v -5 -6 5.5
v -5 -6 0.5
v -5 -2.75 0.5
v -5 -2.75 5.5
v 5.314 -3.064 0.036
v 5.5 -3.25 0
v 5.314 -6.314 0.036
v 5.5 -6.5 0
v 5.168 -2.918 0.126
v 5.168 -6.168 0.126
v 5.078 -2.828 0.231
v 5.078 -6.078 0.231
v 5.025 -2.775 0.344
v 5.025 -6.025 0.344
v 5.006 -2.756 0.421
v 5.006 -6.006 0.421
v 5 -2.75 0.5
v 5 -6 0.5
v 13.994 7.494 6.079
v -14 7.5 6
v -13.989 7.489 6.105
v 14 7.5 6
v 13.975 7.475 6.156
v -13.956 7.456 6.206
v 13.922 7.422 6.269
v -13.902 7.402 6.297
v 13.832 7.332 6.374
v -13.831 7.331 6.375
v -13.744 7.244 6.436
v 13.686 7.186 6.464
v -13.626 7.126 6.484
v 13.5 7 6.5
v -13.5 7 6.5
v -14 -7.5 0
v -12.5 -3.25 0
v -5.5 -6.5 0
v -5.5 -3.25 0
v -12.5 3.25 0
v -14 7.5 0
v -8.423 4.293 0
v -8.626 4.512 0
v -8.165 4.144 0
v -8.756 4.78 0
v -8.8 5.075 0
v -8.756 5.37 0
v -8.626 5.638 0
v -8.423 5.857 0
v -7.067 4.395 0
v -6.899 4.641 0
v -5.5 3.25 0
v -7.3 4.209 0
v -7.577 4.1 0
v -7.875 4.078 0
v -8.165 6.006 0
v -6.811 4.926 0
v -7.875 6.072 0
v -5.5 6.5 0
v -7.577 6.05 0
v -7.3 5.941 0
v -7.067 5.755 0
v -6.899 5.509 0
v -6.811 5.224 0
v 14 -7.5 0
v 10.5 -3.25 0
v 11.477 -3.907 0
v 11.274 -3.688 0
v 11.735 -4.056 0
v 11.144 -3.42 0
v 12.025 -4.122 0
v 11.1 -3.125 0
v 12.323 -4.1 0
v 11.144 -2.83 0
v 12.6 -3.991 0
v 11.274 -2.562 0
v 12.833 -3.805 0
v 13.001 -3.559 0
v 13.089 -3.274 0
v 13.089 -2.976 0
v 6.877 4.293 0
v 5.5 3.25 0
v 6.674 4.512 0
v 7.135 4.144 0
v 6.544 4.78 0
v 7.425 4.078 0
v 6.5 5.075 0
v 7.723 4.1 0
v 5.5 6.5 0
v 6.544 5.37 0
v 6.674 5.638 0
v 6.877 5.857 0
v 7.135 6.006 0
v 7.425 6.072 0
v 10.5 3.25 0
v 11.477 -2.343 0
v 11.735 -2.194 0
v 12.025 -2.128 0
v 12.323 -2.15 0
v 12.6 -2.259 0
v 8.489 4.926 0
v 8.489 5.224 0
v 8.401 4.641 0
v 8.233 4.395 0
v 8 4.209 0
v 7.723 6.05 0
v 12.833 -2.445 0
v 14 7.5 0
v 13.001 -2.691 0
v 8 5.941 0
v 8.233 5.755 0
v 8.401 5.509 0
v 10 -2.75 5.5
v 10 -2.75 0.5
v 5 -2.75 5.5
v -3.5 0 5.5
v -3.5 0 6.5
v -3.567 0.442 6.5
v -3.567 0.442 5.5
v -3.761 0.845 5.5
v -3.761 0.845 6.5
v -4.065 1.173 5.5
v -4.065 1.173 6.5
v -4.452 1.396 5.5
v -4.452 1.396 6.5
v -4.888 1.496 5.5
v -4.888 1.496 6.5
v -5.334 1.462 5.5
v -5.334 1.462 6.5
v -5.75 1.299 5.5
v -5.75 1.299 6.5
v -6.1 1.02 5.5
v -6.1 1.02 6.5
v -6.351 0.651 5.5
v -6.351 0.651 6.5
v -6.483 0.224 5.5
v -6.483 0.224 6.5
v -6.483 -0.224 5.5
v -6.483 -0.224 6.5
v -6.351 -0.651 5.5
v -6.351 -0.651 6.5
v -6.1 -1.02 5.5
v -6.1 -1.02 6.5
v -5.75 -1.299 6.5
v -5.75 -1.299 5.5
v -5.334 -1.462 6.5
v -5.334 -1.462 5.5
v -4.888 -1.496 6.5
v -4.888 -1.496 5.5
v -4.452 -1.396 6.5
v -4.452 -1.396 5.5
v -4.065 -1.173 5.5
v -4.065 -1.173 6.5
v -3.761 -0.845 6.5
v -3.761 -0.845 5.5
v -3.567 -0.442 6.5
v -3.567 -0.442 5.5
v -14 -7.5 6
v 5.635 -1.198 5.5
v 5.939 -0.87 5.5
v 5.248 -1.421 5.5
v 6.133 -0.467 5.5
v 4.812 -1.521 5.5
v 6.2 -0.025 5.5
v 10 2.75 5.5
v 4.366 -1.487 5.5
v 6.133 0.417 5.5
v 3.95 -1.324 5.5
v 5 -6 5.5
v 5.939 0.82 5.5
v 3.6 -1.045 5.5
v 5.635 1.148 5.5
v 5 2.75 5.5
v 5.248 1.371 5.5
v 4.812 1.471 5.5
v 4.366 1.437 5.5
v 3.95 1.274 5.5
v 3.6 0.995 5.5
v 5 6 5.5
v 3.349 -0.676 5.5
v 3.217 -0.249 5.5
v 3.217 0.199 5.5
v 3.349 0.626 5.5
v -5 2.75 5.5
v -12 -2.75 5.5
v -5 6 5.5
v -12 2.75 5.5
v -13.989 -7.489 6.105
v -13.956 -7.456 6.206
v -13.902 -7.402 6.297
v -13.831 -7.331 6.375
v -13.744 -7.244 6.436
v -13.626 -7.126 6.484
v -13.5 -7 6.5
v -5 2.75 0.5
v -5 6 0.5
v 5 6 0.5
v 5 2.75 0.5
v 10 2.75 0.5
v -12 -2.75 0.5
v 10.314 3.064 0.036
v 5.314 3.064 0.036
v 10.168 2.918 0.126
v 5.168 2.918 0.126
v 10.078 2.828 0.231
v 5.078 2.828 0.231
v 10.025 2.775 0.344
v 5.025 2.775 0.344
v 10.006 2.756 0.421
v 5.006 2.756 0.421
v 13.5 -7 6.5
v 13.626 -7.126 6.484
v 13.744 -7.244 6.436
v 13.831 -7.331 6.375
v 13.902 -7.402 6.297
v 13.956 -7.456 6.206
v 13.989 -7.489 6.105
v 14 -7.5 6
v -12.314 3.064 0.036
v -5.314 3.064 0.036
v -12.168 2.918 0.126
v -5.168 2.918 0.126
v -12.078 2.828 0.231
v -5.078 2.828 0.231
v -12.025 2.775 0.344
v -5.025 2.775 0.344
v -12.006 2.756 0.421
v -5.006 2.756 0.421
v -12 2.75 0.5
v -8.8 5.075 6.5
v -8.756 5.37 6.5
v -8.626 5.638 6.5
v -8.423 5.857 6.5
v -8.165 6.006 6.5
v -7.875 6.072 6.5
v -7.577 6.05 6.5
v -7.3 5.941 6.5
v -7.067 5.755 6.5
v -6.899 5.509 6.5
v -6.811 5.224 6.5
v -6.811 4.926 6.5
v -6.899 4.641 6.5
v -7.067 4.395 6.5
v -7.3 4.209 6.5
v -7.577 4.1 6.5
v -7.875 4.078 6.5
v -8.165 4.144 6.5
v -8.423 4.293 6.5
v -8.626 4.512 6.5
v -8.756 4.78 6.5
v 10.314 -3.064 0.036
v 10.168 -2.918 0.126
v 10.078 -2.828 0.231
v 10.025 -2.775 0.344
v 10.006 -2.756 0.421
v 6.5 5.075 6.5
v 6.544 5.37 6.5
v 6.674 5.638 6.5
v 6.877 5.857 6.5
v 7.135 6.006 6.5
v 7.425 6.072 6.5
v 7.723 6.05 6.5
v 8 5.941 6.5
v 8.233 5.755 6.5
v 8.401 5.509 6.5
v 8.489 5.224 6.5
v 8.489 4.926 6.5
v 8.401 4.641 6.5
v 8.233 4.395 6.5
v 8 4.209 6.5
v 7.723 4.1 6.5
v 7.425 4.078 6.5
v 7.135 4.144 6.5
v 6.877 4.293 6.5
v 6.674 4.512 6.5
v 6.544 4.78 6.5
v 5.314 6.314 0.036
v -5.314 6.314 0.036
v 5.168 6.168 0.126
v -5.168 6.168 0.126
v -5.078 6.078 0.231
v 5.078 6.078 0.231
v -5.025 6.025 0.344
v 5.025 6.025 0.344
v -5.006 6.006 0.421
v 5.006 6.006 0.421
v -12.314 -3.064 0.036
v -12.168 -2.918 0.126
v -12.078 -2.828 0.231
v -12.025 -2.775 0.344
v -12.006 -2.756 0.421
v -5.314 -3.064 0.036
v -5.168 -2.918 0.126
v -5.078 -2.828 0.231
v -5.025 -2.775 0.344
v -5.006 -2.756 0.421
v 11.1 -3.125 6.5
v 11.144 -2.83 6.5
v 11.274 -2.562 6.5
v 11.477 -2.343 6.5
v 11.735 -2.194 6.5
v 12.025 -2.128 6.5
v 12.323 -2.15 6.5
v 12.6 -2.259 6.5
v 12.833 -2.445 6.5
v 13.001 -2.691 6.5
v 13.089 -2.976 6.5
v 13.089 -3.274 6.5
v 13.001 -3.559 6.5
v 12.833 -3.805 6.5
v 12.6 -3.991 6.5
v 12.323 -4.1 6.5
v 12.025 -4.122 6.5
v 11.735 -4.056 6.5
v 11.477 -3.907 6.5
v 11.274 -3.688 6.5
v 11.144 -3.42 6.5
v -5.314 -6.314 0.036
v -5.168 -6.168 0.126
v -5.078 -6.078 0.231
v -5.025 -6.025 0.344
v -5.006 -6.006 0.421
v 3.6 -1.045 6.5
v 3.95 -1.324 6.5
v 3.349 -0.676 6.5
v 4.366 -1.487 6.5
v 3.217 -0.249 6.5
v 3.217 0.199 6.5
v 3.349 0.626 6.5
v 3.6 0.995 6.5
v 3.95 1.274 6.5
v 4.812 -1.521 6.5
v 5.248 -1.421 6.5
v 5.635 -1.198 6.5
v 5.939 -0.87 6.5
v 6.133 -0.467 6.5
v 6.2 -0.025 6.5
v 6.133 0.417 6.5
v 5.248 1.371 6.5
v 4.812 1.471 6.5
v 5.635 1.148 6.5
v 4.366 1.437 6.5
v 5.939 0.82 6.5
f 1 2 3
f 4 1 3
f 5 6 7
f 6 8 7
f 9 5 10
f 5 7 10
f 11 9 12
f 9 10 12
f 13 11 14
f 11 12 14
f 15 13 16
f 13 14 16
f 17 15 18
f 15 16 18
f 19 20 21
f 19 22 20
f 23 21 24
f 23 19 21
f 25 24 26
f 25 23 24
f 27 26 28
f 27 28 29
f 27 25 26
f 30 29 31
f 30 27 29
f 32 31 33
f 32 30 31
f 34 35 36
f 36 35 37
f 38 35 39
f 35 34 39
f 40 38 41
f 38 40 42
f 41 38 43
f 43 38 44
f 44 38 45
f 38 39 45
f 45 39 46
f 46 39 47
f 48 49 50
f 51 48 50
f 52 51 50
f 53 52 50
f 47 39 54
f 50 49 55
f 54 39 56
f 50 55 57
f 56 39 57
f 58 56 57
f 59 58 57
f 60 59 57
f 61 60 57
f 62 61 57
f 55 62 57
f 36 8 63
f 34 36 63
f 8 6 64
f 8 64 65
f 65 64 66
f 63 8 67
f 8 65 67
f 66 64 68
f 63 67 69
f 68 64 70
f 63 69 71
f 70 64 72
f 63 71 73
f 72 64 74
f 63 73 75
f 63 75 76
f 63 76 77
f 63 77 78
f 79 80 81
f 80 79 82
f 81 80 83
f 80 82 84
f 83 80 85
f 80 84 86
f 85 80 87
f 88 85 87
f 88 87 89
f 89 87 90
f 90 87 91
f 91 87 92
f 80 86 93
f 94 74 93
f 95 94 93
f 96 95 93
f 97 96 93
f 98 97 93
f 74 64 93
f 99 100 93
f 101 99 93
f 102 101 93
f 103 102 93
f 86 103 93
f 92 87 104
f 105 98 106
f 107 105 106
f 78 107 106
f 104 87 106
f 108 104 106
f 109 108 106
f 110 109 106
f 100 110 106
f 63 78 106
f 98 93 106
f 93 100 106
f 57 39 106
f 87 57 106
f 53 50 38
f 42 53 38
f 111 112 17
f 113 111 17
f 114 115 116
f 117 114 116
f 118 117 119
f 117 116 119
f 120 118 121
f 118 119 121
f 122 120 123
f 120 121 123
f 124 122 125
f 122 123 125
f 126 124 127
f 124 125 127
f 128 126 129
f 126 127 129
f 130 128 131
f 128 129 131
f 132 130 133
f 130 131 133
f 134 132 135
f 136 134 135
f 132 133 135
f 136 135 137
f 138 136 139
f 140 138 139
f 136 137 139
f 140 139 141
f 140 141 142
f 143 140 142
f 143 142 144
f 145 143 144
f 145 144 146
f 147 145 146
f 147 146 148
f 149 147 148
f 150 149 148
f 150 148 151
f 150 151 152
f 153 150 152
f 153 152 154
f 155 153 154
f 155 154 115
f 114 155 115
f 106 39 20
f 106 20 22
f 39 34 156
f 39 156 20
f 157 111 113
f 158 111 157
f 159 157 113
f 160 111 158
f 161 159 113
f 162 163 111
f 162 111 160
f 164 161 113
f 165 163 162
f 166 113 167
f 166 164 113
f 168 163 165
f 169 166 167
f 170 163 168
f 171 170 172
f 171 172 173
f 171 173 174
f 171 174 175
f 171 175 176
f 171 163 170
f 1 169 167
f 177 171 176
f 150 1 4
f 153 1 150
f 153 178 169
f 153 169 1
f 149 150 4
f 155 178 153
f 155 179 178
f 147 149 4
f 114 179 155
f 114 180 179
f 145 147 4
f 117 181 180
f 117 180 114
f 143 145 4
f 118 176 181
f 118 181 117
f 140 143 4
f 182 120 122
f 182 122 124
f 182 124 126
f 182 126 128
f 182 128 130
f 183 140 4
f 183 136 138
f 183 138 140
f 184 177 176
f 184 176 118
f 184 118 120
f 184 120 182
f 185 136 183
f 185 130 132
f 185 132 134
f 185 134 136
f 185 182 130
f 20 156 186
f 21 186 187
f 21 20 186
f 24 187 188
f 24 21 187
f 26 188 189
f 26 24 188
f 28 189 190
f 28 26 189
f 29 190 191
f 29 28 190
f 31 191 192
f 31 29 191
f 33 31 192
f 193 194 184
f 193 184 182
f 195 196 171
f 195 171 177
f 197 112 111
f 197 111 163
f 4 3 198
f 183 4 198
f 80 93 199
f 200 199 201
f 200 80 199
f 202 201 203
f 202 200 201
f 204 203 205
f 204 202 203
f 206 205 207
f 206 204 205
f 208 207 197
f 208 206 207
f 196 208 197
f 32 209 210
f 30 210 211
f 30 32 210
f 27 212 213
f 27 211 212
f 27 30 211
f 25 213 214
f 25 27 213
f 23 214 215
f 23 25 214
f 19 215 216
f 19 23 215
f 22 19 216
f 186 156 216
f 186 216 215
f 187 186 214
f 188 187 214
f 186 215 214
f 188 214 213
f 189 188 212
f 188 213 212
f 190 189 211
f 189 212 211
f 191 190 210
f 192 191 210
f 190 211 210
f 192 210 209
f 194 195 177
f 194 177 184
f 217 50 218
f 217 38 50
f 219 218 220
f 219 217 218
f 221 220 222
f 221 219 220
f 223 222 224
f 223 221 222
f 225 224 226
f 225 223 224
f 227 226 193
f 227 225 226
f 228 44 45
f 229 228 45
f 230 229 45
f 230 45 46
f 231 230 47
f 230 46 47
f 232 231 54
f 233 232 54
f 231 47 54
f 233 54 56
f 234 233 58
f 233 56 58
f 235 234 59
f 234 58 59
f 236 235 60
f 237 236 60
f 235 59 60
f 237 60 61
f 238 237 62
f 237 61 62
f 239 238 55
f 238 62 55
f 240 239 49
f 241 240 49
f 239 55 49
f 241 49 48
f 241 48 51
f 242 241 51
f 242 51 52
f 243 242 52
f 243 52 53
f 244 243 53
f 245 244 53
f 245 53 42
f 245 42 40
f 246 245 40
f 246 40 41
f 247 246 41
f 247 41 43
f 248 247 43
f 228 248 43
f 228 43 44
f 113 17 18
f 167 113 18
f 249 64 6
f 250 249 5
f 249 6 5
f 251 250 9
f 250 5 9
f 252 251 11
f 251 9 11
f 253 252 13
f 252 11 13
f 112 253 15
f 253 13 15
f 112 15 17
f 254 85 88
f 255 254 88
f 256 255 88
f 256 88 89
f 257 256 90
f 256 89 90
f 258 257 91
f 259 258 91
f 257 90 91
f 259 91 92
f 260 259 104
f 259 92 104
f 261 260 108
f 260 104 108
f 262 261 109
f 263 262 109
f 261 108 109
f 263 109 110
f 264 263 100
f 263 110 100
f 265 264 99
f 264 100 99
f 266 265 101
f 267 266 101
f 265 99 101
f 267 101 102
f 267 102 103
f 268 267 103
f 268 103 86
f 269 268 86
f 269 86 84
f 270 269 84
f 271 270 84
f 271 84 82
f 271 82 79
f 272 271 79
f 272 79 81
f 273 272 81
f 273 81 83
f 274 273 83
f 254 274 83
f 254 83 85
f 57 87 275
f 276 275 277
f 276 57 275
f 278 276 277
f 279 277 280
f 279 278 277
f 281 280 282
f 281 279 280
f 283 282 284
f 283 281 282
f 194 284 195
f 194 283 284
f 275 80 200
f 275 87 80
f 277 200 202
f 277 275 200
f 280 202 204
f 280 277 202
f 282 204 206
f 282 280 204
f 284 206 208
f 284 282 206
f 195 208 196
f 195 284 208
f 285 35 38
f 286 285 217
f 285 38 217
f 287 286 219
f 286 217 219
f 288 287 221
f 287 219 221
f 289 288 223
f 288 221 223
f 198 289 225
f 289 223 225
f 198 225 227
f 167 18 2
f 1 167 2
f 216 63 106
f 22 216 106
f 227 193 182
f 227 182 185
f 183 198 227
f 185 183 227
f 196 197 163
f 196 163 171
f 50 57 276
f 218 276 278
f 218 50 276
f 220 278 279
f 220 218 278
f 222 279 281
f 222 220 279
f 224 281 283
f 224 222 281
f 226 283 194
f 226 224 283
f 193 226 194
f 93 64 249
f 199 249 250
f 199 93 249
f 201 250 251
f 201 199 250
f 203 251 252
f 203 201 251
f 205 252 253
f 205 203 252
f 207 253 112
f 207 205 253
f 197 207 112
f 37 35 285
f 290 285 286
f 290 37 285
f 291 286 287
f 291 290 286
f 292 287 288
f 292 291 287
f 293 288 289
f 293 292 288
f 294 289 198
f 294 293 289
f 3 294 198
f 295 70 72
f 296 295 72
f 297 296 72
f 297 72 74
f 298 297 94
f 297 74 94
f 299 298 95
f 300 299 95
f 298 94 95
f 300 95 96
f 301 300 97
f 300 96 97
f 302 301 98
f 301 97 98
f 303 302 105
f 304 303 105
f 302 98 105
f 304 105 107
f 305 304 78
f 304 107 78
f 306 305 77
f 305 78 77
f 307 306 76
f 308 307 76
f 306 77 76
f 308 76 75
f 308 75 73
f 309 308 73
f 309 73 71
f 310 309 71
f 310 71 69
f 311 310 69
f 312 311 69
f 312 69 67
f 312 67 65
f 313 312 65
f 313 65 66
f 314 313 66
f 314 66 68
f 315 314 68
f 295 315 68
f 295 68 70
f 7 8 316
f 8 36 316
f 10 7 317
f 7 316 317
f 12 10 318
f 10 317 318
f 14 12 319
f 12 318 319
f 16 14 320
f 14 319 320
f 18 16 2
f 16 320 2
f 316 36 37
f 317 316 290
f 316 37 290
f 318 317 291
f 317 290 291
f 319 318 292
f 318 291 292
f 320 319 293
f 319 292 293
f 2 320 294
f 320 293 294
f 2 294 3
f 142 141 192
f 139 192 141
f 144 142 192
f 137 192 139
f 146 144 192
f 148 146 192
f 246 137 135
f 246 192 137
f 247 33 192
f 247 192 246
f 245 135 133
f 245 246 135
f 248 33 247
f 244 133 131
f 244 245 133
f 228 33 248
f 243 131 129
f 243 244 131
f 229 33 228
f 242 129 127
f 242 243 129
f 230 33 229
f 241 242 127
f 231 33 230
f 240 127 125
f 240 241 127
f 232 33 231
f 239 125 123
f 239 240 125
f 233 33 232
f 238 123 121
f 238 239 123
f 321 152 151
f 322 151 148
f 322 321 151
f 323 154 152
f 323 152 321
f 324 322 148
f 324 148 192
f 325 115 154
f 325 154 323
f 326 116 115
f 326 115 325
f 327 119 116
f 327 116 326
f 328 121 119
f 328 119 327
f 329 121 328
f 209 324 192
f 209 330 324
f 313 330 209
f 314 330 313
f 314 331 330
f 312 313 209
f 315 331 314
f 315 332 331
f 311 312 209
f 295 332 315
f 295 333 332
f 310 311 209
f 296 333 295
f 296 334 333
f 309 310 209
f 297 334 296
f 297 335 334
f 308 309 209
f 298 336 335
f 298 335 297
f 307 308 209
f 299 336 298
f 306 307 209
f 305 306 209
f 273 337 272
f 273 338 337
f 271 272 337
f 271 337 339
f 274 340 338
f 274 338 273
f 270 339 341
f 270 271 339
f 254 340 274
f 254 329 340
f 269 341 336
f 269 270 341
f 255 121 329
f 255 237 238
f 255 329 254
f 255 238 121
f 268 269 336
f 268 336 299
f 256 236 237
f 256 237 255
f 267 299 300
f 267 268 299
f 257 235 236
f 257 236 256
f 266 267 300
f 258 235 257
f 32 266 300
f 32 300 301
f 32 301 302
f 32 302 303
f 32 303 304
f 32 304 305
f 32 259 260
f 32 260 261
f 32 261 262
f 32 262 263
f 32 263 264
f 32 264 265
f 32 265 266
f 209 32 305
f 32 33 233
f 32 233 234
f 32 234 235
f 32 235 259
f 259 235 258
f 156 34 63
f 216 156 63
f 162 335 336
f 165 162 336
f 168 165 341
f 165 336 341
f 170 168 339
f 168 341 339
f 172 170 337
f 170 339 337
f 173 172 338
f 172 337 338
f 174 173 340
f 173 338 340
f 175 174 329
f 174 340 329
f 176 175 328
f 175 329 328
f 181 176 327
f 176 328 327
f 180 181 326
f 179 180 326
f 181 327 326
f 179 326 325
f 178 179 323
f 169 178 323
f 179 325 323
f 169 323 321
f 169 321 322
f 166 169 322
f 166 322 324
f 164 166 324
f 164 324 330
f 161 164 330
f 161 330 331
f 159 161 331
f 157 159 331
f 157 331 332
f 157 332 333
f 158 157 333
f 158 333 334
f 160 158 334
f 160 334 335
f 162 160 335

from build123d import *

# Parameters (mm, degrees)
ESBO_O1_W                = 28
ESBO_O1_H                = 15
RESSALTO_EXTRUS_O1_DEPTH = 6.5
ESBO_O2_W                = 20
ESBO_O2_H                = 5.5
CORTE_EXTRUS_O1_DEPTH    = 5.5
ESBO_O3_R                = 1
CORTE_EXTRUS_O2_DEPTH    = 18.161002302
CORTE_EXTRUS_O3_DEPTH    = 5.5
CORTE_EXTRUS_O4_DEPTH    = 5.5
ESBO_O6_W                = 2
ESBO_O6_H                = 5.5
CORTE_EXTRUS_O5_DEPTH    = 5.5
ESBO_O7_R                = 1.5
CORTE_EXTRUS_O6_DEPTH    = 5.5
FILETE1_R                = 0.5
FILETE2_R                = 0.5


with BuildPart() as part:
    # Esboço1 → Ressalto-extrusão1 (new body)
    with BuildSketch(Plane.XY):
        Rectangle(ESBO_O1_W, ESBO_O1_H)
    extrude(amount=RESSALTO_EXTRUS_O1_DEPTH)

    # Esboço2 → Corte-extrusão1 (cut)
    with BuildSketch(Plane(origin=(0, 0, 0), x_dir=(-1, 0, 0), z_dir=(0, 0, -1))):
        Rectangle(ESBO_O2_W, ESBO_O2_H)
    extrude(amount=-CORTE_EXTRUS_O1_DEPTH, mode=Mode.SUBTRACT)

    # Esboço3 → Corte-extrusão2 (cut, through all)
    with BuildSketch(Plane(origin=(0, 0, 0), x_dir=(-1, 0, 0), z_dir=(0, 0, -1))):
        with Locations((-7.5, 5.075)):
            Circle(ESBO_O3_R)
        with Locations((7.8, 5.075)):
            Circle(ESBO_O3_R)
        with Locations((-12.1, -3.125)):
            Circle(ESBO_O3_R)
    extrude(amount=-CORTE_EXTRUS_O2_DEPTH, mode=Mode.SUBTRACT)

    # Esboço4 → Corte-extrusão3 (cut)
    with BuildSketch(Plane(origin=(0, 0, 0), x_dir=(-1, 0, 0), z_dir=(0, 0, -1))):
        Polygon((0, -2.75), (-5, -2.75), (-5, -6), (5, -6), (5, -2.75), align=None)
    extrude(amount=-CORTE_EXTRUS_O3_DEPTH, mode=Mode.SUBTRACT)

    # Esboço5 → Corte-extrusão4 (cut)
    with BuildSketch(Plane(origin=(0, 0, 0), x_dir=(-1, 0, 0), z_dir=(0, 0, -1))):
        Polygon((0, 2.75), (-5, 2.75), (-5, 6), (5, 6), (5, 2.75), align=None)
    extrude(amount=-CORTE_EXTRUS_O4_DEPTH, mode=Mode.SUBTRACT)

    # Esboço6 → Corte-extrusão5 (cut)
    with BuildSketch(Plane(origin=(0, 0, 0), x_dir=(-1, 0, 0), z_dir=(0, 0, -1))):
        with Locations((11, 0)):
            Rectangle(ESBO_O6_W, ESBO_O6_H)
    extrude(amount=-CORTE_EXTRUS_O5_DEPTH, mode=Mode.SUBTRACT)

    # Esboço7 → Corte-extrusão6 (cut)
    with BuildSketch(Plane.XY.offset(6.5)):
        with Locations((-5, 0)):
            Circle(ESBO_O7_R)
        with Locations((4.7, -0.025)):
            Circle(ESBO_O7_R)
    extrude(amount=-CORTE_EXTRUS_O6_DEPTH, mode=Mode.SUBTRACT)

    # Filete1
    filete1_edges = [part.edges().sort_by_distance(p)[0] for p in [
        (-14, 0, 6.5),
        (0, -7.5, 6.5),
        (14, 0, 6.5),
        (0, 7.5, 6.5),
    ]]
    fillet(filete1_edges, radius=FILETE1_R)

    # Filete2
    filete2_edges = [part.edges().sort_by_distance(p)[0] for p in [
        (10, 0, 0),
        (7.5, -2.75, 0),
        (-8.5, 2.75, 0),
        (-8.5, -2.75, 0),
        (-5, -4.375, 0),
        (5, -4.375, 0),
        (0, -6, 0),
        (7.5, 2.75, 0),
        (-5, 4.375, 0),
        (0, 6, 0),
        (5, 4.375, 0),
        (-12, 0, 0),
    ]]
    fillet(filete2_edges, radius=FILETE2_R)


solid = part.part
